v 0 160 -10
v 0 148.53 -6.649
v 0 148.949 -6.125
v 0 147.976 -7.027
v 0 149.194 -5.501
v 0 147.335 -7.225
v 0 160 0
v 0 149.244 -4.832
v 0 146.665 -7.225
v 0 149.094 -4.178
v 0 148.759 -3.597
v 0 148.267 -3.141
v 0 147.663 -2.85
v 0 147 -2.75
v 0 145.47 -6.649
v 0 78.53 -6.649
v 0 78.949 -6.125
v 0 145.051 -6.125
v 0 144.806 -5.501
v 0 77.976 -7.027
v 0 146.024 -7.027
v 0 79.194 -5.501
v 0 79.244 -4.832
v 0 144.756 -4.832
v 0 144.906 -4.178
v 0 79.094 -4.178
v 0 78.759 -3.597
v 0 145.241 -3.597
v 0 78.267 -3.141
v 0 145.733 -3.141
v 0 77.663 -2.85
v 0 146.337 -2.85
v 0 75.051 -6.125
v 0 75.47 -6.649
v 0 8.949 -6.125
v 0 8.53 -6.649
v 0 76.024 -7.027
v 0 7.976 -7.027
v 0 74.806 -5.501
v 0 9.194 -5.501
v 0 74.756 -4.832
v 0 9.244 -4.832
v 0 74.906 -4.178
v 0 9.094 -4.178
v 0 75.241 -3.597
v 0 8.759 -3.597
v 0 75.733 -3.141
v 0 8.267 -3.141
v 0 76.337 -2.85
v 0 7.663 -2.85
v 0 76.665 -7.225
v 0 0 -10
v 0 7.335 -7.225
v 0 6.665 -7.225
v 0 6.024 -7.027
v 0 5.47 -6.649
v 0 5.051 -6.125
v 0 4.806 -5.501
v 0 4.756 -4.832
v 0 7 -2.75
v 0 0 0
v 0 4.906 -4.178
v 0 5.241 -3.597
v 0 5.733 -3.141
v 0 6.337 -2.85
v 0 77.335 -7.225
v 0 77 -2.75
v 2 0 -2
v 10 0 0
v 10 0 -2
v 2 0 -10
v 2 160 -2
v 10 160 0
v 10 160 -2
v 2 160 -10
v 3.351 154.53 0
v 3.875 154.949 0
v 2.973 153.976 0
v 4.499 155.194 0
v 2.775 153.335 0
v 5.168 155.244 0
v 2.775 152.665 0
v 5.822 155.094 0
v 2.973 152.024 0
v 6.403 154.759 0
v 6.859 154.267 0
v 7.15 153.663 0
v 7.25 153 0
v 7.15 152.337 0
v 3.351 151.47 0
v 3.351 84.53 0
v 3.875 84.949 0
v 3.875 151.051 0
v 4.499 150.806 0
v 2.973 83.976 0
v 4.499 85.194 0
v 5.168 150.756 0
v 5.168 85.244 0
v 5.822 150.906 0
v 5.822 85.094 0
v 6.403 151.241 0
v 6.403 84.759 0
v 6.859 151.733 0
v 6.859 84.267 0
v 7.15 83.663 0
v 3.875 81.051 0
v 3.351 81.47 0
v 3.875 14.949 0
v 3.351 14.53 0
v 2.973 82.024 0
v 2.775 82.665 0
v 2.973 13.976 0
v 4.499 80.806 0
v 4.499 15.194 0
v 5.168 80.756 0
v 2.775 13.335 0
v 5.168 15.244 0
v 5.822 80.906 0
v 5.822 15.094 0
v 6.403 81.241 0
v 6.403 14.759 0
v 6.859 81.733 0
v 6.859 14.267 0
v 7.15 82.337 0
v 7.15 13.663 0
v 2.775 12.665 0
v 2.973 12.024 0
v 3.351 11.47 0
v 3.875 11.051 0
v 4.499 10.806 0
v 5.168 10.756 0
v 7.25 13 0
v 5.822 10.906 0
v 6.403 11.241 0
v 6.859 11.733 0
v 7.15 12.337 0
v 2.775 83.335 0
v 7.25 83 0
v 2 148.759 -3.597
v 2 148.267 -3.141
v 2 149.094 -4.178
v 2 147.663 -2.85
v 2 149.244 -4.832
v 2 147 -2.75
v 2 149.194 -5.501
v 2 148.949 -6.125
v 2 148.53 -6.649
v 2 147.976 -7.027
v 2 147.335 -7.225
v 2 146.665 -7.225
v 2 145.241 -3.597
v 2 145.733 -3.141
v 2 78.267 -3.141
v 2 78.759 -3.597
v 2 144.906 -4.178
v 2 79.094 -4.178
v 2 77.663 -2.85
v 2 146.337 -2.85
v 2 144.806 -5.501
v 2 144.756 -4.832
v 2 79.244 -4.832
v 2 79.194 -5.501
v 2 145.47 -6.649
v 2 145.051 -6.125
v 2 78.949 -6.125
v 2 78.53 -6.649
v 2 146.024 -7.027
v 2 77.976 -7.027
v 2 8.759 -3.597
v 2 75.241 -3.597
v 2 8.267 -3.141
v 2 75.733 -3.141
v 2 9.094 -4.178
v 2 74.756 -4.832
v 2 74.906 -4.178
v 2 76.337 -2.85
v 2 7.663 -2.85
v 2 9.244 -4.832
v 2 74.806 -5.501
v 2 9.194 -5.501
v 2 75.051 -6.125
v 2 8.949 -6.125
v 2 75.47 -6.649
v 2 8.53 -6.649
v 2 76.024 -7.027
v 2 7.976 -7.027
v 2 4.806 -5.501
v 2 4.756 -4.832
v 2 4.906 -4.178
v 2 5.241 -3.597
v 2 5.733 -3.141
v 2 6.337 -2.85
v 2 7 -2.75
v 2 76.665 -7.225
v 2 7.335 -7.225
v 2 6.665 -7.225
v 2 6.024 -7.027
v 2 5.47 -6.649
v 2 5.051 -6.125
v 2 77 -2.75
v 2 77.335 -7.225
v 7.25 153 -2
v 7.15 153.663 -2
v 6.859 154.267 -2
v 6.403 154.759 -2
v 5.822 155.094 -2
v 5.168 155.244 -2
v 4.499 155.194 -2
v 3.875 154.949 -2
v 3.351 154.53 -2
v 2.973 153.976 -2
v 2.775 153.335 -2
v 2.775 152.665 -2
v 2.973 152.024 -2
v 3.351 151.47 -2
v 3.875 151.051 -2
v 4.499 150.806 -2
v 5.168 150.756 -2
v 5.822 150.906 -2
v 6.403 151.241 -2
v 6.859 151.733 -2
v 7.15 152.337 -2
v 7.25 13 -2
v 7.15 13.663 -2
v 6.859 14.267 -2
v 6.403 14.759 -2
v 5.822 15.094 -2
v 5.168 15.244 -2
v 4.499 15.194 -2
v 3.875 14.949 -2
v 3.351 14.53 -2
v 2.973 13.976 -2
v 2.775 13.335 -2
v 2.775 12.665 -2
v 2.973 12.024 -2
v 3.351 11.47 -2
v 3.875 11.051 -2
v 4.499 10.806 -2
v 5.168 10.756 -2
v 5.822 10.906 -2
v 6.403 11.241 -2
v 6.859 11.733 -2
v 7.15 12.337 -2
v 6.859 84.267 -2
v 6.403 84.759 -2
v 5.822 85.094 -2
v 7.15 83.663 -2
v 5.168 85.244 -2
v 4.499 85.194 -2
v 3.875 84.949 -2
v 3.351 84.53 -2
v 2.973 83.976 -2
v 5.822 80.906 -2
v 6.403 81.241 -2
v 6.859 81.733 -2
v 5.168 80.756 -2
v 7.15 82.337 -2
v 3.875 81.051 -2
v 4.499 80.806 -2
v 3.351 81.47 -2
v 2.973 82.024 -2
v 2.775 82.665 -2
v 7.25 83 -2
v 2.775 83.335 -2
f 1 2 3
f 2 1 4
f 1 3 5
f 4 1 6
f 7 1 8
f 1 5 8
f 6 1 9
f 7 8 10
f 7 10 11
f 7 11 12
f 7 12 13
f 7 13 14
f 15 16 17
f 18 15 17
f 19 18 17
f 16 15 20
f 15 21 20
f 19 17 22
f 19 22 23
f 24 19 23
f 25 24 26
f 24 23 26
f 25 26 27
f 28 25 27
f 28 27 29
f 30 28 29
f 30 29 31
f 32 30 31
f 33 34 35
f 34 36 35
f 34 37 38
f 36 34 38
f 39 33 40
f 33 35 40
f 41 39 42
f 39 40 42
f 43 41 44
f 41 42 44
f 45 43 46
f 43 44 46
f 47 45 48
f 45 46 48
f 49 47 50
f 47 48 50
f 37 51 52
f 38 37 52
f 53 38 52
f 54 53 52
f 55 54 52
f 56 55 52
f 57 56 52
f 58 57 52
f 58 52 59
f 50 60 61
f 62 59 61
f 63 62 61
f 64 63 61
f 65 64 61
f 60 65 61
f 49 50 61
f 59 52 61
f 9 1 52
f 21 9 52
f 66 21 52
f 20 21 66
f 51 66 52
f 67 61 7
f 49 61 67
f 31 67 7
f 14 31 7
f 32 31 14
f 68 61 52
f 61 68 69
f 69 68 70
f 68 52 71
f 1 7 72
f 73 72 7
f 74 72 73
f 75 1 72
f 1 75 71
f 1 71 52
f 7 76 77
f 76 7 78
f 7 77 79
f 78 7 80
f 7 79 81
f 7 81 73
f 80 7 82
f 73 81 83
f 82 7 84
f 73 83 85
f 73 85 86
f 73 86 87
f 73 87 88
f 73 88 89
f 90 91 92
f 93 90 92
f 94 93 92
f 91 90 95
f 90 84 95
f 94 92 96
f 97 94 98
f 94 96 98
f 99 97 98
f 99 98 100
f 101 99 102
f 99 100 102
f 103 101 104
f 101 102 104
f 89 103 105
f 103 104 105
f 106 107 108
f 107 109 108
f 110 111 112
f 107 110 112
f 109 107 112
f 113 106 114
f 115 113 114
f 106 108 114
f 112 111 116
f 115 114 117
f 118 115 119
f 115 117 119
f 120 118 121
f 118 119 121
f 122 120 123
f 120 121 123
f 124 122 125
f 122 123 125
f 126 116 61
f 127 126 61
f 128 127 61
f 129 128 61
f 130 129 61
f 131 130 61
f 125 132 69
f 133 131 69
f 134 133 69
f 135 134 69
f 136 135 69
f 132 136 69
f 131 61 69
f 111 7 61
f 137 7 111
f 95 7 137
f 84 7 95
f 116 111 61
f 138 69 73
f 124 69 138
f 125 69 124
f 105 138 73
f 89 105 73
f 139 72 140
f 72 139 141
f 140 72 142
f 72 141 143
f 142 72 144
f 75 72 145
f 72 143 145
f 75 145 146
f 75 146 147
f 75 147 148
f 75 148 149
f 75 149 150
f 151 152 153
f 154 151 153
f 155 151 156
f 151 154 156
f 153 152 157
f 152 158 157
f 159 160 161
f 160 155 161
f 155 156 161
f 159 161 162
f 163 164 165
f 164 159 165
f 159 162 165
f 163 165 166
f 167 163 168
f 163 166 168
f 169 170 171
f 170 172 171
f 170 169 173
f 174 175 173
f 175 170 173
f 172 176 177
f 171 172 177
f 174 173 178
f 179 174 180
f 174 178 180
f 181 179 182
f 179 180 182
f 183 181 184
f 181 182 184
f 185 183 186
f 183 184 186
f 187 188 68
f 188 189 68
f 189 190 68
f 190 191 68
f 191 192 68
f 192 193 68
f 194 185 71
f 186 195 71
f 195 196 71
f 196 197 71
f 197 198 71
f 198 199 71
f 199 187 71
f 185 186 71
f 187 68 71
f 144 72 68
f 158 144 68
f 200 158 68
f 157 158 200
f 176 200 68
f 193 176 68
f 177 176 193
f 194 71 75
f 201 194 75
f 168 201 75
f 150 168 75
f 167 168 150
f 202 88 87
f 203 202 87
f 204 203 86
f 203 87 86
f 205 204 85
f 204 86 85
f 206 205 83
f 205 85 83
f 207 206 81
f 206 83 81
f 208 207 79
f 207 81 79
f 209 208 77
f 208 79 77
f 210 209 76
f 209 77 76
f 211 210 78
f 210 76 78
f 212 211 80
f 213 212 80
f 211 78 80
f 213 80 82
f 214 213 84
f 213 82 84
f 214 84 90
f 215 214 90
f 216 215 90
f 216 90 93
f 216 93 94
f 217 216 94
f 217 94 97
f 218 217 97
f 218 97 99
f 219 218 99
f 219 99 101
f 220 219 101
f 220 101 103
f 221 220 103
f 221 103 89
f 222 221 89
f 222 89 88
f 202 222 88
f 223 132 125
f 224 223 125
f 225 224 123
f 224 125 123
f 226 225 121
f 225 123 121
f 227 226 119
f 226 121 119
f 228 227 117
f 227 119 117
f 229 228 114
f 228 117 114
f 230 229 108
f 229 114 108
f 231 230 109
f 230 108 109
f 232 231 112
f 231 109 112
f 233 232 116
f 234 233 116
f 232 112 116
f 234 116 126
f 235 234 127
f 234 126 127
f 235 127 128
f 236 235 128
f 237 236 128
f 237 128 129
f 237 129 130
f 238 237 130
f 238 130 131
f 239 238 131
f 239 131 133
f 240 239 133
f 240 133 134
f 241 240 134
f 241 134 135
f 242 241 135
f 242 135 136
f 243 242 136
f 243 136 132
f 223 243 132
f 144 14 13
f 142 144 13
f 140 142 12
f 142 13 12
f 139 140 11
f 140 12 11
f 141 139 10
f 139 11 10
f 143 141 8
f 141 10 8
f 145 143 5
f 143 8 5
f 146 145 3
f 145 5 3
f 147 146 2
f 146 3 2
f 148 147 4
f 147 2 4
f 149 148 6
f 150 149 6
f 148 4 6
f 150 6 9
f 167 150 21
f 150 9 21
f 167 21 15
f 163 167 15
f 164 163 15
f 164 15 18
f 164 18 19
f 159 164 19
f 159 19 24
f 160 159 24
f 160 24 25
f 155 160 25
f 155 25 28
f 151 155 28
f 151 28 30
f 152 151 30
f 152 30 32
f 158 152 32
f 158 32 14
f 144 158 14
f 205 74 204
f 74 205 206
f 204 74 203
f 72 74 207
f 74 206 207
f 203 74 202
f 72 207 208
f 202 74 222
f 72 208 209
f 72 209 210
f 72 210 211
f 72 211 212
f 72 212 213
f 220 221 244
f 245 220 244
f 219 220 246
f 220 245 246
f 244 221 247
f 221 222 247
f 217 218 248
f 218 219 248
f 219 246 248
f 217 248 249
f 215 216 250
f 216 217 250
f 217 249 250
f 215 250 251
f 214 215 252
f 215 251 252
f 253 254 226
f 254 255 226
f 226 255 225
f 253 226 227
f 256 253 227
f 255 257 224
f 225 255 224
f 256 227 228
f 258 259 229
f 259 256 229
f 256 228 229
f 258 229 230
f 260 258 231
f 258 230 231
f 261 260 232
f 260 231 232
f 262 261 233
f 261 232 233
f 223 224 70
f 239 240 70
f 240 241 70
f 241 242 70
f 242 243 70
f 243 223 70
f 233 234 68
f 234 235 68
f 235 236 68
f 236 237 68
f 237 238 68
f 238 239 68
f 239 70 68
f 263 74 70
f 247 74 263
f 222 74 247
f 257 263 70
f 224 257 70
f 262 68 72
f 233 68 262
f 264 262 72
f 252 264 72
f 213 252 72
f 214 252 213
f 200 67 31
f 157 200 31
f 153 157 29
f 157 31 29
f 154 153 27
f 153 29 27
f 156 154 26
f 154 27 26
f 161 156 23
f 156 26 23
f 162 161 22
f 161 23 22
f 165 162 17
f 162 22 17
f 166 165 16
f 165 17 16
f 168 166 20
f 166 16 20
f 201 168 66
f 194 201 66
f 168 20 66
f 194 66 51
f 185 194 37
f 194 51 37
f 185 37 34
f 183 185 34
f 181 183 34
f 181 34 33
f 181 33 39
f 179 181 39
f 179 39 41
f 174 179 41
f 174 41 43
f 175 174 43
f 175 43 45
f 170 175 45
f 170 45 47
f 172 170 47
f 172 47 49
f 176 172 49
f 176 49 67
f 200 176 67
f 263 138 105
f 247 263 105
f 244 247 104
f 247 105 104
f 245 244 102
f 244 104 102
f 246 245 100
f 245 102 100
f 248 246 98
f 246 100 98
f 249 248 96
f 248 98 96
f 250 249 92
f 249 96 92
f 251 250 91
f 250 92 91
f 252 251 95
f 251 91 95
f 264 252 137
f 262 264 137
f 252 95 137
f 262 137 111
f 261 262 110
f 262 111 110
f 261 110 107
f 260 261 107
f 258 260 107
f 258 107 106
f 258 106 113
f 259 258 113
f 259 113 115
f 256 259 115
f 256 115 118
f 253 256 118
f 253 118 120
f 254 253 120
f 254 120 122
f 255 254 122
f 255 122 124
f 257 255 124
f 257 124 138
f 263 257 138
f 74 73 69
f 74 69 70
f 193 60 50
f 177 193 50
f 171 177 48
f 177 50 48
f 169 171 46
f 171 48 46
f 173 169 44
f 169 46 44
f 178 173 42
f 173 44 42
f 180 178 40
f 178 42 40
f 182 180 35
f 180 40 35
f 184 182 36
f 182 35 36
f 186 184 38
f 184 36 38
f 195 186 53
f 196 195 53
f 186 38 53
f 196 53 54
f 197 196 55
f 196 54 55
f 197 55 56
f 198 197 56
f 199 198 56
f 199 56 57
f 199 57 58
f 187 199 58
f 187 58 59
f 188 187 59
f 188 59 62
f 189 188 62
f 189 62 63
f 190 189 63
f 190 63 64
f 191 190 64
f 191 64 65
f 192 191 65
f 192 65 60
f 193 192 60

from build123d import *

# Parameters (mm, degrees)
EXTRUDE_1_DEPTH     = 160
CUT_EXTRUDE_1_REACH = 12
SKETCH_2_R          = 2.25
CUT_EXTRUDE_2_REACH = 12
SKETCH_3_R          = 2.25


with BuildPart() as part:
    # Эскиз1 → Бобышка-Вытянуть1 (new body)
    with BuildSketch(Plane(origin=(0, 0, 0), x_dir=(1, 0, 0), z_dir=(0, 1, 0))):
        Polygon((0, 10), (0, 0), (10, 0), (10, 2), (2, 2), (2, 10), align=None)
    extrude(amount=EXTRUDE_1_DEPTH)

    # Эскиз2 → Вырез-Вытянуть1 (cut, up to next)
    with BuildSketch(Plane.XY, mode=Mode.PRIVATE) as cut_extrude_1_sk1:
        with Locations((5, 13)):
            Circle(SKETCH_2_R)
    cut_extrude_1_tool1 = extrude(cut_extrude_1_sk1.sketch, amount=-CUT_EXTRUDE_1_REACH, mode=Mode.PRIVATE) & part.part
    add(cut_extrude_1_tool1.solids().sort_by_distance((5, 13, 0))[0], mode=Mode.SUBTRACT)
    # Эскиз2 → Вырез-Вытянуть1 (cut, up to next)
    with BuildSketch(Plane.XY, mode=Mode.PRIVATE) as cut_extrude_1_sk2:
        with Locations((5, 83)):
            Circle(SKETCH_2_R)
    cut_extrude_1_tool2 = extrude(cut_extrude_1_sk2.sketch, amount=-CUT_EXTRUDE_1_REACH, mode=Mode.PRIVATE) & part.part
    add(cut_extrude_1_tool2.solids().sort_by_distance((5, 83, 0))[0], mode=Mode.SUBTRACT)
    # Эскиз2 → Вырез-Вытянуть1 (cut, up to next)
    with BuildSketch(Plane.XY, mode=Mode.PRIVATE) as cut_extrude_1_sk3:
        with Locations((5, 153)):
            Circle(SKETCH_2_R)
    cut_extrude_1_tool3 = extrude(cut_extrude_1_sk3.sketch, amount=-CUT_EXTRUDE_1_REACH, mode=Mode.PRIVATE) & part.part
    add(cut_extrude_1_tool3.solids().sort_by_distance((5, 153, 0))[0], mode=Mode.SUBTRACT)

    # Эскиз3 → Вырез-Вытянуть2 (cut, up to next)
    with BuildSketch(Plane.ZY, mode=Mode.PRIVATE) as cut_extrude_2_sk1:
        with Locations((-5, 7)):
            Circle(SKETCH_3_R)
    cut_extrude_2_tool1 = extrude(cut_extrude_2_sk1.sketch, amount=-CUT_EXTRUDE_2_REACH, mode=Mode.PRIVATE) & part.part
    add(cut_extrude_2_tool1.solids().sort_by_distance((0, 7, -5))[0], mode=Mode.SUBTRACT)
    # Эскиз3 → Вырез-Вытянуть2 (cut, up to next)
    with BuildSketch(Plane.ZY, mode=Mode.PRIVATE) as cut_extrude_2_sk2:
        with Locations((-5, 77)):
            Circle(SKETCH_3_R)
    cut_extrude_2_tool2 = extrude(cut_extrude_2_sk2.sketch, amount=-CUT_EXTRUDE_2_REACH, mode=Mode.PRIVATE) & part.part
    add(cut_extrude_2_tool2.solids().sort_by_distance((0, 77, -5))[0], mode=Mode.SUBTRACT)
    # Эскиз3 → Вырез-Вытянуть2 (cut, up to next)
    with BuildSketch(Plane.ZY, mode=Mode.PRIVATE) as cut_extrude_2_sk3:
        with Locations((-5, 147)):
            Circle(SKETCH_3_R)
    cut_extrude_2_tool3 = extrude(cut_extrude_2_sk3.sketch, amount=-CUT_EXTRUDE_2_REACH, mode=Mode.PRIVATE) & part.part
    add(cut_extrude_2_tool3.solids().sort_by_distance((0, 147, -5))[0], mode=Mode.SUBTRACT)


solid = part.part
